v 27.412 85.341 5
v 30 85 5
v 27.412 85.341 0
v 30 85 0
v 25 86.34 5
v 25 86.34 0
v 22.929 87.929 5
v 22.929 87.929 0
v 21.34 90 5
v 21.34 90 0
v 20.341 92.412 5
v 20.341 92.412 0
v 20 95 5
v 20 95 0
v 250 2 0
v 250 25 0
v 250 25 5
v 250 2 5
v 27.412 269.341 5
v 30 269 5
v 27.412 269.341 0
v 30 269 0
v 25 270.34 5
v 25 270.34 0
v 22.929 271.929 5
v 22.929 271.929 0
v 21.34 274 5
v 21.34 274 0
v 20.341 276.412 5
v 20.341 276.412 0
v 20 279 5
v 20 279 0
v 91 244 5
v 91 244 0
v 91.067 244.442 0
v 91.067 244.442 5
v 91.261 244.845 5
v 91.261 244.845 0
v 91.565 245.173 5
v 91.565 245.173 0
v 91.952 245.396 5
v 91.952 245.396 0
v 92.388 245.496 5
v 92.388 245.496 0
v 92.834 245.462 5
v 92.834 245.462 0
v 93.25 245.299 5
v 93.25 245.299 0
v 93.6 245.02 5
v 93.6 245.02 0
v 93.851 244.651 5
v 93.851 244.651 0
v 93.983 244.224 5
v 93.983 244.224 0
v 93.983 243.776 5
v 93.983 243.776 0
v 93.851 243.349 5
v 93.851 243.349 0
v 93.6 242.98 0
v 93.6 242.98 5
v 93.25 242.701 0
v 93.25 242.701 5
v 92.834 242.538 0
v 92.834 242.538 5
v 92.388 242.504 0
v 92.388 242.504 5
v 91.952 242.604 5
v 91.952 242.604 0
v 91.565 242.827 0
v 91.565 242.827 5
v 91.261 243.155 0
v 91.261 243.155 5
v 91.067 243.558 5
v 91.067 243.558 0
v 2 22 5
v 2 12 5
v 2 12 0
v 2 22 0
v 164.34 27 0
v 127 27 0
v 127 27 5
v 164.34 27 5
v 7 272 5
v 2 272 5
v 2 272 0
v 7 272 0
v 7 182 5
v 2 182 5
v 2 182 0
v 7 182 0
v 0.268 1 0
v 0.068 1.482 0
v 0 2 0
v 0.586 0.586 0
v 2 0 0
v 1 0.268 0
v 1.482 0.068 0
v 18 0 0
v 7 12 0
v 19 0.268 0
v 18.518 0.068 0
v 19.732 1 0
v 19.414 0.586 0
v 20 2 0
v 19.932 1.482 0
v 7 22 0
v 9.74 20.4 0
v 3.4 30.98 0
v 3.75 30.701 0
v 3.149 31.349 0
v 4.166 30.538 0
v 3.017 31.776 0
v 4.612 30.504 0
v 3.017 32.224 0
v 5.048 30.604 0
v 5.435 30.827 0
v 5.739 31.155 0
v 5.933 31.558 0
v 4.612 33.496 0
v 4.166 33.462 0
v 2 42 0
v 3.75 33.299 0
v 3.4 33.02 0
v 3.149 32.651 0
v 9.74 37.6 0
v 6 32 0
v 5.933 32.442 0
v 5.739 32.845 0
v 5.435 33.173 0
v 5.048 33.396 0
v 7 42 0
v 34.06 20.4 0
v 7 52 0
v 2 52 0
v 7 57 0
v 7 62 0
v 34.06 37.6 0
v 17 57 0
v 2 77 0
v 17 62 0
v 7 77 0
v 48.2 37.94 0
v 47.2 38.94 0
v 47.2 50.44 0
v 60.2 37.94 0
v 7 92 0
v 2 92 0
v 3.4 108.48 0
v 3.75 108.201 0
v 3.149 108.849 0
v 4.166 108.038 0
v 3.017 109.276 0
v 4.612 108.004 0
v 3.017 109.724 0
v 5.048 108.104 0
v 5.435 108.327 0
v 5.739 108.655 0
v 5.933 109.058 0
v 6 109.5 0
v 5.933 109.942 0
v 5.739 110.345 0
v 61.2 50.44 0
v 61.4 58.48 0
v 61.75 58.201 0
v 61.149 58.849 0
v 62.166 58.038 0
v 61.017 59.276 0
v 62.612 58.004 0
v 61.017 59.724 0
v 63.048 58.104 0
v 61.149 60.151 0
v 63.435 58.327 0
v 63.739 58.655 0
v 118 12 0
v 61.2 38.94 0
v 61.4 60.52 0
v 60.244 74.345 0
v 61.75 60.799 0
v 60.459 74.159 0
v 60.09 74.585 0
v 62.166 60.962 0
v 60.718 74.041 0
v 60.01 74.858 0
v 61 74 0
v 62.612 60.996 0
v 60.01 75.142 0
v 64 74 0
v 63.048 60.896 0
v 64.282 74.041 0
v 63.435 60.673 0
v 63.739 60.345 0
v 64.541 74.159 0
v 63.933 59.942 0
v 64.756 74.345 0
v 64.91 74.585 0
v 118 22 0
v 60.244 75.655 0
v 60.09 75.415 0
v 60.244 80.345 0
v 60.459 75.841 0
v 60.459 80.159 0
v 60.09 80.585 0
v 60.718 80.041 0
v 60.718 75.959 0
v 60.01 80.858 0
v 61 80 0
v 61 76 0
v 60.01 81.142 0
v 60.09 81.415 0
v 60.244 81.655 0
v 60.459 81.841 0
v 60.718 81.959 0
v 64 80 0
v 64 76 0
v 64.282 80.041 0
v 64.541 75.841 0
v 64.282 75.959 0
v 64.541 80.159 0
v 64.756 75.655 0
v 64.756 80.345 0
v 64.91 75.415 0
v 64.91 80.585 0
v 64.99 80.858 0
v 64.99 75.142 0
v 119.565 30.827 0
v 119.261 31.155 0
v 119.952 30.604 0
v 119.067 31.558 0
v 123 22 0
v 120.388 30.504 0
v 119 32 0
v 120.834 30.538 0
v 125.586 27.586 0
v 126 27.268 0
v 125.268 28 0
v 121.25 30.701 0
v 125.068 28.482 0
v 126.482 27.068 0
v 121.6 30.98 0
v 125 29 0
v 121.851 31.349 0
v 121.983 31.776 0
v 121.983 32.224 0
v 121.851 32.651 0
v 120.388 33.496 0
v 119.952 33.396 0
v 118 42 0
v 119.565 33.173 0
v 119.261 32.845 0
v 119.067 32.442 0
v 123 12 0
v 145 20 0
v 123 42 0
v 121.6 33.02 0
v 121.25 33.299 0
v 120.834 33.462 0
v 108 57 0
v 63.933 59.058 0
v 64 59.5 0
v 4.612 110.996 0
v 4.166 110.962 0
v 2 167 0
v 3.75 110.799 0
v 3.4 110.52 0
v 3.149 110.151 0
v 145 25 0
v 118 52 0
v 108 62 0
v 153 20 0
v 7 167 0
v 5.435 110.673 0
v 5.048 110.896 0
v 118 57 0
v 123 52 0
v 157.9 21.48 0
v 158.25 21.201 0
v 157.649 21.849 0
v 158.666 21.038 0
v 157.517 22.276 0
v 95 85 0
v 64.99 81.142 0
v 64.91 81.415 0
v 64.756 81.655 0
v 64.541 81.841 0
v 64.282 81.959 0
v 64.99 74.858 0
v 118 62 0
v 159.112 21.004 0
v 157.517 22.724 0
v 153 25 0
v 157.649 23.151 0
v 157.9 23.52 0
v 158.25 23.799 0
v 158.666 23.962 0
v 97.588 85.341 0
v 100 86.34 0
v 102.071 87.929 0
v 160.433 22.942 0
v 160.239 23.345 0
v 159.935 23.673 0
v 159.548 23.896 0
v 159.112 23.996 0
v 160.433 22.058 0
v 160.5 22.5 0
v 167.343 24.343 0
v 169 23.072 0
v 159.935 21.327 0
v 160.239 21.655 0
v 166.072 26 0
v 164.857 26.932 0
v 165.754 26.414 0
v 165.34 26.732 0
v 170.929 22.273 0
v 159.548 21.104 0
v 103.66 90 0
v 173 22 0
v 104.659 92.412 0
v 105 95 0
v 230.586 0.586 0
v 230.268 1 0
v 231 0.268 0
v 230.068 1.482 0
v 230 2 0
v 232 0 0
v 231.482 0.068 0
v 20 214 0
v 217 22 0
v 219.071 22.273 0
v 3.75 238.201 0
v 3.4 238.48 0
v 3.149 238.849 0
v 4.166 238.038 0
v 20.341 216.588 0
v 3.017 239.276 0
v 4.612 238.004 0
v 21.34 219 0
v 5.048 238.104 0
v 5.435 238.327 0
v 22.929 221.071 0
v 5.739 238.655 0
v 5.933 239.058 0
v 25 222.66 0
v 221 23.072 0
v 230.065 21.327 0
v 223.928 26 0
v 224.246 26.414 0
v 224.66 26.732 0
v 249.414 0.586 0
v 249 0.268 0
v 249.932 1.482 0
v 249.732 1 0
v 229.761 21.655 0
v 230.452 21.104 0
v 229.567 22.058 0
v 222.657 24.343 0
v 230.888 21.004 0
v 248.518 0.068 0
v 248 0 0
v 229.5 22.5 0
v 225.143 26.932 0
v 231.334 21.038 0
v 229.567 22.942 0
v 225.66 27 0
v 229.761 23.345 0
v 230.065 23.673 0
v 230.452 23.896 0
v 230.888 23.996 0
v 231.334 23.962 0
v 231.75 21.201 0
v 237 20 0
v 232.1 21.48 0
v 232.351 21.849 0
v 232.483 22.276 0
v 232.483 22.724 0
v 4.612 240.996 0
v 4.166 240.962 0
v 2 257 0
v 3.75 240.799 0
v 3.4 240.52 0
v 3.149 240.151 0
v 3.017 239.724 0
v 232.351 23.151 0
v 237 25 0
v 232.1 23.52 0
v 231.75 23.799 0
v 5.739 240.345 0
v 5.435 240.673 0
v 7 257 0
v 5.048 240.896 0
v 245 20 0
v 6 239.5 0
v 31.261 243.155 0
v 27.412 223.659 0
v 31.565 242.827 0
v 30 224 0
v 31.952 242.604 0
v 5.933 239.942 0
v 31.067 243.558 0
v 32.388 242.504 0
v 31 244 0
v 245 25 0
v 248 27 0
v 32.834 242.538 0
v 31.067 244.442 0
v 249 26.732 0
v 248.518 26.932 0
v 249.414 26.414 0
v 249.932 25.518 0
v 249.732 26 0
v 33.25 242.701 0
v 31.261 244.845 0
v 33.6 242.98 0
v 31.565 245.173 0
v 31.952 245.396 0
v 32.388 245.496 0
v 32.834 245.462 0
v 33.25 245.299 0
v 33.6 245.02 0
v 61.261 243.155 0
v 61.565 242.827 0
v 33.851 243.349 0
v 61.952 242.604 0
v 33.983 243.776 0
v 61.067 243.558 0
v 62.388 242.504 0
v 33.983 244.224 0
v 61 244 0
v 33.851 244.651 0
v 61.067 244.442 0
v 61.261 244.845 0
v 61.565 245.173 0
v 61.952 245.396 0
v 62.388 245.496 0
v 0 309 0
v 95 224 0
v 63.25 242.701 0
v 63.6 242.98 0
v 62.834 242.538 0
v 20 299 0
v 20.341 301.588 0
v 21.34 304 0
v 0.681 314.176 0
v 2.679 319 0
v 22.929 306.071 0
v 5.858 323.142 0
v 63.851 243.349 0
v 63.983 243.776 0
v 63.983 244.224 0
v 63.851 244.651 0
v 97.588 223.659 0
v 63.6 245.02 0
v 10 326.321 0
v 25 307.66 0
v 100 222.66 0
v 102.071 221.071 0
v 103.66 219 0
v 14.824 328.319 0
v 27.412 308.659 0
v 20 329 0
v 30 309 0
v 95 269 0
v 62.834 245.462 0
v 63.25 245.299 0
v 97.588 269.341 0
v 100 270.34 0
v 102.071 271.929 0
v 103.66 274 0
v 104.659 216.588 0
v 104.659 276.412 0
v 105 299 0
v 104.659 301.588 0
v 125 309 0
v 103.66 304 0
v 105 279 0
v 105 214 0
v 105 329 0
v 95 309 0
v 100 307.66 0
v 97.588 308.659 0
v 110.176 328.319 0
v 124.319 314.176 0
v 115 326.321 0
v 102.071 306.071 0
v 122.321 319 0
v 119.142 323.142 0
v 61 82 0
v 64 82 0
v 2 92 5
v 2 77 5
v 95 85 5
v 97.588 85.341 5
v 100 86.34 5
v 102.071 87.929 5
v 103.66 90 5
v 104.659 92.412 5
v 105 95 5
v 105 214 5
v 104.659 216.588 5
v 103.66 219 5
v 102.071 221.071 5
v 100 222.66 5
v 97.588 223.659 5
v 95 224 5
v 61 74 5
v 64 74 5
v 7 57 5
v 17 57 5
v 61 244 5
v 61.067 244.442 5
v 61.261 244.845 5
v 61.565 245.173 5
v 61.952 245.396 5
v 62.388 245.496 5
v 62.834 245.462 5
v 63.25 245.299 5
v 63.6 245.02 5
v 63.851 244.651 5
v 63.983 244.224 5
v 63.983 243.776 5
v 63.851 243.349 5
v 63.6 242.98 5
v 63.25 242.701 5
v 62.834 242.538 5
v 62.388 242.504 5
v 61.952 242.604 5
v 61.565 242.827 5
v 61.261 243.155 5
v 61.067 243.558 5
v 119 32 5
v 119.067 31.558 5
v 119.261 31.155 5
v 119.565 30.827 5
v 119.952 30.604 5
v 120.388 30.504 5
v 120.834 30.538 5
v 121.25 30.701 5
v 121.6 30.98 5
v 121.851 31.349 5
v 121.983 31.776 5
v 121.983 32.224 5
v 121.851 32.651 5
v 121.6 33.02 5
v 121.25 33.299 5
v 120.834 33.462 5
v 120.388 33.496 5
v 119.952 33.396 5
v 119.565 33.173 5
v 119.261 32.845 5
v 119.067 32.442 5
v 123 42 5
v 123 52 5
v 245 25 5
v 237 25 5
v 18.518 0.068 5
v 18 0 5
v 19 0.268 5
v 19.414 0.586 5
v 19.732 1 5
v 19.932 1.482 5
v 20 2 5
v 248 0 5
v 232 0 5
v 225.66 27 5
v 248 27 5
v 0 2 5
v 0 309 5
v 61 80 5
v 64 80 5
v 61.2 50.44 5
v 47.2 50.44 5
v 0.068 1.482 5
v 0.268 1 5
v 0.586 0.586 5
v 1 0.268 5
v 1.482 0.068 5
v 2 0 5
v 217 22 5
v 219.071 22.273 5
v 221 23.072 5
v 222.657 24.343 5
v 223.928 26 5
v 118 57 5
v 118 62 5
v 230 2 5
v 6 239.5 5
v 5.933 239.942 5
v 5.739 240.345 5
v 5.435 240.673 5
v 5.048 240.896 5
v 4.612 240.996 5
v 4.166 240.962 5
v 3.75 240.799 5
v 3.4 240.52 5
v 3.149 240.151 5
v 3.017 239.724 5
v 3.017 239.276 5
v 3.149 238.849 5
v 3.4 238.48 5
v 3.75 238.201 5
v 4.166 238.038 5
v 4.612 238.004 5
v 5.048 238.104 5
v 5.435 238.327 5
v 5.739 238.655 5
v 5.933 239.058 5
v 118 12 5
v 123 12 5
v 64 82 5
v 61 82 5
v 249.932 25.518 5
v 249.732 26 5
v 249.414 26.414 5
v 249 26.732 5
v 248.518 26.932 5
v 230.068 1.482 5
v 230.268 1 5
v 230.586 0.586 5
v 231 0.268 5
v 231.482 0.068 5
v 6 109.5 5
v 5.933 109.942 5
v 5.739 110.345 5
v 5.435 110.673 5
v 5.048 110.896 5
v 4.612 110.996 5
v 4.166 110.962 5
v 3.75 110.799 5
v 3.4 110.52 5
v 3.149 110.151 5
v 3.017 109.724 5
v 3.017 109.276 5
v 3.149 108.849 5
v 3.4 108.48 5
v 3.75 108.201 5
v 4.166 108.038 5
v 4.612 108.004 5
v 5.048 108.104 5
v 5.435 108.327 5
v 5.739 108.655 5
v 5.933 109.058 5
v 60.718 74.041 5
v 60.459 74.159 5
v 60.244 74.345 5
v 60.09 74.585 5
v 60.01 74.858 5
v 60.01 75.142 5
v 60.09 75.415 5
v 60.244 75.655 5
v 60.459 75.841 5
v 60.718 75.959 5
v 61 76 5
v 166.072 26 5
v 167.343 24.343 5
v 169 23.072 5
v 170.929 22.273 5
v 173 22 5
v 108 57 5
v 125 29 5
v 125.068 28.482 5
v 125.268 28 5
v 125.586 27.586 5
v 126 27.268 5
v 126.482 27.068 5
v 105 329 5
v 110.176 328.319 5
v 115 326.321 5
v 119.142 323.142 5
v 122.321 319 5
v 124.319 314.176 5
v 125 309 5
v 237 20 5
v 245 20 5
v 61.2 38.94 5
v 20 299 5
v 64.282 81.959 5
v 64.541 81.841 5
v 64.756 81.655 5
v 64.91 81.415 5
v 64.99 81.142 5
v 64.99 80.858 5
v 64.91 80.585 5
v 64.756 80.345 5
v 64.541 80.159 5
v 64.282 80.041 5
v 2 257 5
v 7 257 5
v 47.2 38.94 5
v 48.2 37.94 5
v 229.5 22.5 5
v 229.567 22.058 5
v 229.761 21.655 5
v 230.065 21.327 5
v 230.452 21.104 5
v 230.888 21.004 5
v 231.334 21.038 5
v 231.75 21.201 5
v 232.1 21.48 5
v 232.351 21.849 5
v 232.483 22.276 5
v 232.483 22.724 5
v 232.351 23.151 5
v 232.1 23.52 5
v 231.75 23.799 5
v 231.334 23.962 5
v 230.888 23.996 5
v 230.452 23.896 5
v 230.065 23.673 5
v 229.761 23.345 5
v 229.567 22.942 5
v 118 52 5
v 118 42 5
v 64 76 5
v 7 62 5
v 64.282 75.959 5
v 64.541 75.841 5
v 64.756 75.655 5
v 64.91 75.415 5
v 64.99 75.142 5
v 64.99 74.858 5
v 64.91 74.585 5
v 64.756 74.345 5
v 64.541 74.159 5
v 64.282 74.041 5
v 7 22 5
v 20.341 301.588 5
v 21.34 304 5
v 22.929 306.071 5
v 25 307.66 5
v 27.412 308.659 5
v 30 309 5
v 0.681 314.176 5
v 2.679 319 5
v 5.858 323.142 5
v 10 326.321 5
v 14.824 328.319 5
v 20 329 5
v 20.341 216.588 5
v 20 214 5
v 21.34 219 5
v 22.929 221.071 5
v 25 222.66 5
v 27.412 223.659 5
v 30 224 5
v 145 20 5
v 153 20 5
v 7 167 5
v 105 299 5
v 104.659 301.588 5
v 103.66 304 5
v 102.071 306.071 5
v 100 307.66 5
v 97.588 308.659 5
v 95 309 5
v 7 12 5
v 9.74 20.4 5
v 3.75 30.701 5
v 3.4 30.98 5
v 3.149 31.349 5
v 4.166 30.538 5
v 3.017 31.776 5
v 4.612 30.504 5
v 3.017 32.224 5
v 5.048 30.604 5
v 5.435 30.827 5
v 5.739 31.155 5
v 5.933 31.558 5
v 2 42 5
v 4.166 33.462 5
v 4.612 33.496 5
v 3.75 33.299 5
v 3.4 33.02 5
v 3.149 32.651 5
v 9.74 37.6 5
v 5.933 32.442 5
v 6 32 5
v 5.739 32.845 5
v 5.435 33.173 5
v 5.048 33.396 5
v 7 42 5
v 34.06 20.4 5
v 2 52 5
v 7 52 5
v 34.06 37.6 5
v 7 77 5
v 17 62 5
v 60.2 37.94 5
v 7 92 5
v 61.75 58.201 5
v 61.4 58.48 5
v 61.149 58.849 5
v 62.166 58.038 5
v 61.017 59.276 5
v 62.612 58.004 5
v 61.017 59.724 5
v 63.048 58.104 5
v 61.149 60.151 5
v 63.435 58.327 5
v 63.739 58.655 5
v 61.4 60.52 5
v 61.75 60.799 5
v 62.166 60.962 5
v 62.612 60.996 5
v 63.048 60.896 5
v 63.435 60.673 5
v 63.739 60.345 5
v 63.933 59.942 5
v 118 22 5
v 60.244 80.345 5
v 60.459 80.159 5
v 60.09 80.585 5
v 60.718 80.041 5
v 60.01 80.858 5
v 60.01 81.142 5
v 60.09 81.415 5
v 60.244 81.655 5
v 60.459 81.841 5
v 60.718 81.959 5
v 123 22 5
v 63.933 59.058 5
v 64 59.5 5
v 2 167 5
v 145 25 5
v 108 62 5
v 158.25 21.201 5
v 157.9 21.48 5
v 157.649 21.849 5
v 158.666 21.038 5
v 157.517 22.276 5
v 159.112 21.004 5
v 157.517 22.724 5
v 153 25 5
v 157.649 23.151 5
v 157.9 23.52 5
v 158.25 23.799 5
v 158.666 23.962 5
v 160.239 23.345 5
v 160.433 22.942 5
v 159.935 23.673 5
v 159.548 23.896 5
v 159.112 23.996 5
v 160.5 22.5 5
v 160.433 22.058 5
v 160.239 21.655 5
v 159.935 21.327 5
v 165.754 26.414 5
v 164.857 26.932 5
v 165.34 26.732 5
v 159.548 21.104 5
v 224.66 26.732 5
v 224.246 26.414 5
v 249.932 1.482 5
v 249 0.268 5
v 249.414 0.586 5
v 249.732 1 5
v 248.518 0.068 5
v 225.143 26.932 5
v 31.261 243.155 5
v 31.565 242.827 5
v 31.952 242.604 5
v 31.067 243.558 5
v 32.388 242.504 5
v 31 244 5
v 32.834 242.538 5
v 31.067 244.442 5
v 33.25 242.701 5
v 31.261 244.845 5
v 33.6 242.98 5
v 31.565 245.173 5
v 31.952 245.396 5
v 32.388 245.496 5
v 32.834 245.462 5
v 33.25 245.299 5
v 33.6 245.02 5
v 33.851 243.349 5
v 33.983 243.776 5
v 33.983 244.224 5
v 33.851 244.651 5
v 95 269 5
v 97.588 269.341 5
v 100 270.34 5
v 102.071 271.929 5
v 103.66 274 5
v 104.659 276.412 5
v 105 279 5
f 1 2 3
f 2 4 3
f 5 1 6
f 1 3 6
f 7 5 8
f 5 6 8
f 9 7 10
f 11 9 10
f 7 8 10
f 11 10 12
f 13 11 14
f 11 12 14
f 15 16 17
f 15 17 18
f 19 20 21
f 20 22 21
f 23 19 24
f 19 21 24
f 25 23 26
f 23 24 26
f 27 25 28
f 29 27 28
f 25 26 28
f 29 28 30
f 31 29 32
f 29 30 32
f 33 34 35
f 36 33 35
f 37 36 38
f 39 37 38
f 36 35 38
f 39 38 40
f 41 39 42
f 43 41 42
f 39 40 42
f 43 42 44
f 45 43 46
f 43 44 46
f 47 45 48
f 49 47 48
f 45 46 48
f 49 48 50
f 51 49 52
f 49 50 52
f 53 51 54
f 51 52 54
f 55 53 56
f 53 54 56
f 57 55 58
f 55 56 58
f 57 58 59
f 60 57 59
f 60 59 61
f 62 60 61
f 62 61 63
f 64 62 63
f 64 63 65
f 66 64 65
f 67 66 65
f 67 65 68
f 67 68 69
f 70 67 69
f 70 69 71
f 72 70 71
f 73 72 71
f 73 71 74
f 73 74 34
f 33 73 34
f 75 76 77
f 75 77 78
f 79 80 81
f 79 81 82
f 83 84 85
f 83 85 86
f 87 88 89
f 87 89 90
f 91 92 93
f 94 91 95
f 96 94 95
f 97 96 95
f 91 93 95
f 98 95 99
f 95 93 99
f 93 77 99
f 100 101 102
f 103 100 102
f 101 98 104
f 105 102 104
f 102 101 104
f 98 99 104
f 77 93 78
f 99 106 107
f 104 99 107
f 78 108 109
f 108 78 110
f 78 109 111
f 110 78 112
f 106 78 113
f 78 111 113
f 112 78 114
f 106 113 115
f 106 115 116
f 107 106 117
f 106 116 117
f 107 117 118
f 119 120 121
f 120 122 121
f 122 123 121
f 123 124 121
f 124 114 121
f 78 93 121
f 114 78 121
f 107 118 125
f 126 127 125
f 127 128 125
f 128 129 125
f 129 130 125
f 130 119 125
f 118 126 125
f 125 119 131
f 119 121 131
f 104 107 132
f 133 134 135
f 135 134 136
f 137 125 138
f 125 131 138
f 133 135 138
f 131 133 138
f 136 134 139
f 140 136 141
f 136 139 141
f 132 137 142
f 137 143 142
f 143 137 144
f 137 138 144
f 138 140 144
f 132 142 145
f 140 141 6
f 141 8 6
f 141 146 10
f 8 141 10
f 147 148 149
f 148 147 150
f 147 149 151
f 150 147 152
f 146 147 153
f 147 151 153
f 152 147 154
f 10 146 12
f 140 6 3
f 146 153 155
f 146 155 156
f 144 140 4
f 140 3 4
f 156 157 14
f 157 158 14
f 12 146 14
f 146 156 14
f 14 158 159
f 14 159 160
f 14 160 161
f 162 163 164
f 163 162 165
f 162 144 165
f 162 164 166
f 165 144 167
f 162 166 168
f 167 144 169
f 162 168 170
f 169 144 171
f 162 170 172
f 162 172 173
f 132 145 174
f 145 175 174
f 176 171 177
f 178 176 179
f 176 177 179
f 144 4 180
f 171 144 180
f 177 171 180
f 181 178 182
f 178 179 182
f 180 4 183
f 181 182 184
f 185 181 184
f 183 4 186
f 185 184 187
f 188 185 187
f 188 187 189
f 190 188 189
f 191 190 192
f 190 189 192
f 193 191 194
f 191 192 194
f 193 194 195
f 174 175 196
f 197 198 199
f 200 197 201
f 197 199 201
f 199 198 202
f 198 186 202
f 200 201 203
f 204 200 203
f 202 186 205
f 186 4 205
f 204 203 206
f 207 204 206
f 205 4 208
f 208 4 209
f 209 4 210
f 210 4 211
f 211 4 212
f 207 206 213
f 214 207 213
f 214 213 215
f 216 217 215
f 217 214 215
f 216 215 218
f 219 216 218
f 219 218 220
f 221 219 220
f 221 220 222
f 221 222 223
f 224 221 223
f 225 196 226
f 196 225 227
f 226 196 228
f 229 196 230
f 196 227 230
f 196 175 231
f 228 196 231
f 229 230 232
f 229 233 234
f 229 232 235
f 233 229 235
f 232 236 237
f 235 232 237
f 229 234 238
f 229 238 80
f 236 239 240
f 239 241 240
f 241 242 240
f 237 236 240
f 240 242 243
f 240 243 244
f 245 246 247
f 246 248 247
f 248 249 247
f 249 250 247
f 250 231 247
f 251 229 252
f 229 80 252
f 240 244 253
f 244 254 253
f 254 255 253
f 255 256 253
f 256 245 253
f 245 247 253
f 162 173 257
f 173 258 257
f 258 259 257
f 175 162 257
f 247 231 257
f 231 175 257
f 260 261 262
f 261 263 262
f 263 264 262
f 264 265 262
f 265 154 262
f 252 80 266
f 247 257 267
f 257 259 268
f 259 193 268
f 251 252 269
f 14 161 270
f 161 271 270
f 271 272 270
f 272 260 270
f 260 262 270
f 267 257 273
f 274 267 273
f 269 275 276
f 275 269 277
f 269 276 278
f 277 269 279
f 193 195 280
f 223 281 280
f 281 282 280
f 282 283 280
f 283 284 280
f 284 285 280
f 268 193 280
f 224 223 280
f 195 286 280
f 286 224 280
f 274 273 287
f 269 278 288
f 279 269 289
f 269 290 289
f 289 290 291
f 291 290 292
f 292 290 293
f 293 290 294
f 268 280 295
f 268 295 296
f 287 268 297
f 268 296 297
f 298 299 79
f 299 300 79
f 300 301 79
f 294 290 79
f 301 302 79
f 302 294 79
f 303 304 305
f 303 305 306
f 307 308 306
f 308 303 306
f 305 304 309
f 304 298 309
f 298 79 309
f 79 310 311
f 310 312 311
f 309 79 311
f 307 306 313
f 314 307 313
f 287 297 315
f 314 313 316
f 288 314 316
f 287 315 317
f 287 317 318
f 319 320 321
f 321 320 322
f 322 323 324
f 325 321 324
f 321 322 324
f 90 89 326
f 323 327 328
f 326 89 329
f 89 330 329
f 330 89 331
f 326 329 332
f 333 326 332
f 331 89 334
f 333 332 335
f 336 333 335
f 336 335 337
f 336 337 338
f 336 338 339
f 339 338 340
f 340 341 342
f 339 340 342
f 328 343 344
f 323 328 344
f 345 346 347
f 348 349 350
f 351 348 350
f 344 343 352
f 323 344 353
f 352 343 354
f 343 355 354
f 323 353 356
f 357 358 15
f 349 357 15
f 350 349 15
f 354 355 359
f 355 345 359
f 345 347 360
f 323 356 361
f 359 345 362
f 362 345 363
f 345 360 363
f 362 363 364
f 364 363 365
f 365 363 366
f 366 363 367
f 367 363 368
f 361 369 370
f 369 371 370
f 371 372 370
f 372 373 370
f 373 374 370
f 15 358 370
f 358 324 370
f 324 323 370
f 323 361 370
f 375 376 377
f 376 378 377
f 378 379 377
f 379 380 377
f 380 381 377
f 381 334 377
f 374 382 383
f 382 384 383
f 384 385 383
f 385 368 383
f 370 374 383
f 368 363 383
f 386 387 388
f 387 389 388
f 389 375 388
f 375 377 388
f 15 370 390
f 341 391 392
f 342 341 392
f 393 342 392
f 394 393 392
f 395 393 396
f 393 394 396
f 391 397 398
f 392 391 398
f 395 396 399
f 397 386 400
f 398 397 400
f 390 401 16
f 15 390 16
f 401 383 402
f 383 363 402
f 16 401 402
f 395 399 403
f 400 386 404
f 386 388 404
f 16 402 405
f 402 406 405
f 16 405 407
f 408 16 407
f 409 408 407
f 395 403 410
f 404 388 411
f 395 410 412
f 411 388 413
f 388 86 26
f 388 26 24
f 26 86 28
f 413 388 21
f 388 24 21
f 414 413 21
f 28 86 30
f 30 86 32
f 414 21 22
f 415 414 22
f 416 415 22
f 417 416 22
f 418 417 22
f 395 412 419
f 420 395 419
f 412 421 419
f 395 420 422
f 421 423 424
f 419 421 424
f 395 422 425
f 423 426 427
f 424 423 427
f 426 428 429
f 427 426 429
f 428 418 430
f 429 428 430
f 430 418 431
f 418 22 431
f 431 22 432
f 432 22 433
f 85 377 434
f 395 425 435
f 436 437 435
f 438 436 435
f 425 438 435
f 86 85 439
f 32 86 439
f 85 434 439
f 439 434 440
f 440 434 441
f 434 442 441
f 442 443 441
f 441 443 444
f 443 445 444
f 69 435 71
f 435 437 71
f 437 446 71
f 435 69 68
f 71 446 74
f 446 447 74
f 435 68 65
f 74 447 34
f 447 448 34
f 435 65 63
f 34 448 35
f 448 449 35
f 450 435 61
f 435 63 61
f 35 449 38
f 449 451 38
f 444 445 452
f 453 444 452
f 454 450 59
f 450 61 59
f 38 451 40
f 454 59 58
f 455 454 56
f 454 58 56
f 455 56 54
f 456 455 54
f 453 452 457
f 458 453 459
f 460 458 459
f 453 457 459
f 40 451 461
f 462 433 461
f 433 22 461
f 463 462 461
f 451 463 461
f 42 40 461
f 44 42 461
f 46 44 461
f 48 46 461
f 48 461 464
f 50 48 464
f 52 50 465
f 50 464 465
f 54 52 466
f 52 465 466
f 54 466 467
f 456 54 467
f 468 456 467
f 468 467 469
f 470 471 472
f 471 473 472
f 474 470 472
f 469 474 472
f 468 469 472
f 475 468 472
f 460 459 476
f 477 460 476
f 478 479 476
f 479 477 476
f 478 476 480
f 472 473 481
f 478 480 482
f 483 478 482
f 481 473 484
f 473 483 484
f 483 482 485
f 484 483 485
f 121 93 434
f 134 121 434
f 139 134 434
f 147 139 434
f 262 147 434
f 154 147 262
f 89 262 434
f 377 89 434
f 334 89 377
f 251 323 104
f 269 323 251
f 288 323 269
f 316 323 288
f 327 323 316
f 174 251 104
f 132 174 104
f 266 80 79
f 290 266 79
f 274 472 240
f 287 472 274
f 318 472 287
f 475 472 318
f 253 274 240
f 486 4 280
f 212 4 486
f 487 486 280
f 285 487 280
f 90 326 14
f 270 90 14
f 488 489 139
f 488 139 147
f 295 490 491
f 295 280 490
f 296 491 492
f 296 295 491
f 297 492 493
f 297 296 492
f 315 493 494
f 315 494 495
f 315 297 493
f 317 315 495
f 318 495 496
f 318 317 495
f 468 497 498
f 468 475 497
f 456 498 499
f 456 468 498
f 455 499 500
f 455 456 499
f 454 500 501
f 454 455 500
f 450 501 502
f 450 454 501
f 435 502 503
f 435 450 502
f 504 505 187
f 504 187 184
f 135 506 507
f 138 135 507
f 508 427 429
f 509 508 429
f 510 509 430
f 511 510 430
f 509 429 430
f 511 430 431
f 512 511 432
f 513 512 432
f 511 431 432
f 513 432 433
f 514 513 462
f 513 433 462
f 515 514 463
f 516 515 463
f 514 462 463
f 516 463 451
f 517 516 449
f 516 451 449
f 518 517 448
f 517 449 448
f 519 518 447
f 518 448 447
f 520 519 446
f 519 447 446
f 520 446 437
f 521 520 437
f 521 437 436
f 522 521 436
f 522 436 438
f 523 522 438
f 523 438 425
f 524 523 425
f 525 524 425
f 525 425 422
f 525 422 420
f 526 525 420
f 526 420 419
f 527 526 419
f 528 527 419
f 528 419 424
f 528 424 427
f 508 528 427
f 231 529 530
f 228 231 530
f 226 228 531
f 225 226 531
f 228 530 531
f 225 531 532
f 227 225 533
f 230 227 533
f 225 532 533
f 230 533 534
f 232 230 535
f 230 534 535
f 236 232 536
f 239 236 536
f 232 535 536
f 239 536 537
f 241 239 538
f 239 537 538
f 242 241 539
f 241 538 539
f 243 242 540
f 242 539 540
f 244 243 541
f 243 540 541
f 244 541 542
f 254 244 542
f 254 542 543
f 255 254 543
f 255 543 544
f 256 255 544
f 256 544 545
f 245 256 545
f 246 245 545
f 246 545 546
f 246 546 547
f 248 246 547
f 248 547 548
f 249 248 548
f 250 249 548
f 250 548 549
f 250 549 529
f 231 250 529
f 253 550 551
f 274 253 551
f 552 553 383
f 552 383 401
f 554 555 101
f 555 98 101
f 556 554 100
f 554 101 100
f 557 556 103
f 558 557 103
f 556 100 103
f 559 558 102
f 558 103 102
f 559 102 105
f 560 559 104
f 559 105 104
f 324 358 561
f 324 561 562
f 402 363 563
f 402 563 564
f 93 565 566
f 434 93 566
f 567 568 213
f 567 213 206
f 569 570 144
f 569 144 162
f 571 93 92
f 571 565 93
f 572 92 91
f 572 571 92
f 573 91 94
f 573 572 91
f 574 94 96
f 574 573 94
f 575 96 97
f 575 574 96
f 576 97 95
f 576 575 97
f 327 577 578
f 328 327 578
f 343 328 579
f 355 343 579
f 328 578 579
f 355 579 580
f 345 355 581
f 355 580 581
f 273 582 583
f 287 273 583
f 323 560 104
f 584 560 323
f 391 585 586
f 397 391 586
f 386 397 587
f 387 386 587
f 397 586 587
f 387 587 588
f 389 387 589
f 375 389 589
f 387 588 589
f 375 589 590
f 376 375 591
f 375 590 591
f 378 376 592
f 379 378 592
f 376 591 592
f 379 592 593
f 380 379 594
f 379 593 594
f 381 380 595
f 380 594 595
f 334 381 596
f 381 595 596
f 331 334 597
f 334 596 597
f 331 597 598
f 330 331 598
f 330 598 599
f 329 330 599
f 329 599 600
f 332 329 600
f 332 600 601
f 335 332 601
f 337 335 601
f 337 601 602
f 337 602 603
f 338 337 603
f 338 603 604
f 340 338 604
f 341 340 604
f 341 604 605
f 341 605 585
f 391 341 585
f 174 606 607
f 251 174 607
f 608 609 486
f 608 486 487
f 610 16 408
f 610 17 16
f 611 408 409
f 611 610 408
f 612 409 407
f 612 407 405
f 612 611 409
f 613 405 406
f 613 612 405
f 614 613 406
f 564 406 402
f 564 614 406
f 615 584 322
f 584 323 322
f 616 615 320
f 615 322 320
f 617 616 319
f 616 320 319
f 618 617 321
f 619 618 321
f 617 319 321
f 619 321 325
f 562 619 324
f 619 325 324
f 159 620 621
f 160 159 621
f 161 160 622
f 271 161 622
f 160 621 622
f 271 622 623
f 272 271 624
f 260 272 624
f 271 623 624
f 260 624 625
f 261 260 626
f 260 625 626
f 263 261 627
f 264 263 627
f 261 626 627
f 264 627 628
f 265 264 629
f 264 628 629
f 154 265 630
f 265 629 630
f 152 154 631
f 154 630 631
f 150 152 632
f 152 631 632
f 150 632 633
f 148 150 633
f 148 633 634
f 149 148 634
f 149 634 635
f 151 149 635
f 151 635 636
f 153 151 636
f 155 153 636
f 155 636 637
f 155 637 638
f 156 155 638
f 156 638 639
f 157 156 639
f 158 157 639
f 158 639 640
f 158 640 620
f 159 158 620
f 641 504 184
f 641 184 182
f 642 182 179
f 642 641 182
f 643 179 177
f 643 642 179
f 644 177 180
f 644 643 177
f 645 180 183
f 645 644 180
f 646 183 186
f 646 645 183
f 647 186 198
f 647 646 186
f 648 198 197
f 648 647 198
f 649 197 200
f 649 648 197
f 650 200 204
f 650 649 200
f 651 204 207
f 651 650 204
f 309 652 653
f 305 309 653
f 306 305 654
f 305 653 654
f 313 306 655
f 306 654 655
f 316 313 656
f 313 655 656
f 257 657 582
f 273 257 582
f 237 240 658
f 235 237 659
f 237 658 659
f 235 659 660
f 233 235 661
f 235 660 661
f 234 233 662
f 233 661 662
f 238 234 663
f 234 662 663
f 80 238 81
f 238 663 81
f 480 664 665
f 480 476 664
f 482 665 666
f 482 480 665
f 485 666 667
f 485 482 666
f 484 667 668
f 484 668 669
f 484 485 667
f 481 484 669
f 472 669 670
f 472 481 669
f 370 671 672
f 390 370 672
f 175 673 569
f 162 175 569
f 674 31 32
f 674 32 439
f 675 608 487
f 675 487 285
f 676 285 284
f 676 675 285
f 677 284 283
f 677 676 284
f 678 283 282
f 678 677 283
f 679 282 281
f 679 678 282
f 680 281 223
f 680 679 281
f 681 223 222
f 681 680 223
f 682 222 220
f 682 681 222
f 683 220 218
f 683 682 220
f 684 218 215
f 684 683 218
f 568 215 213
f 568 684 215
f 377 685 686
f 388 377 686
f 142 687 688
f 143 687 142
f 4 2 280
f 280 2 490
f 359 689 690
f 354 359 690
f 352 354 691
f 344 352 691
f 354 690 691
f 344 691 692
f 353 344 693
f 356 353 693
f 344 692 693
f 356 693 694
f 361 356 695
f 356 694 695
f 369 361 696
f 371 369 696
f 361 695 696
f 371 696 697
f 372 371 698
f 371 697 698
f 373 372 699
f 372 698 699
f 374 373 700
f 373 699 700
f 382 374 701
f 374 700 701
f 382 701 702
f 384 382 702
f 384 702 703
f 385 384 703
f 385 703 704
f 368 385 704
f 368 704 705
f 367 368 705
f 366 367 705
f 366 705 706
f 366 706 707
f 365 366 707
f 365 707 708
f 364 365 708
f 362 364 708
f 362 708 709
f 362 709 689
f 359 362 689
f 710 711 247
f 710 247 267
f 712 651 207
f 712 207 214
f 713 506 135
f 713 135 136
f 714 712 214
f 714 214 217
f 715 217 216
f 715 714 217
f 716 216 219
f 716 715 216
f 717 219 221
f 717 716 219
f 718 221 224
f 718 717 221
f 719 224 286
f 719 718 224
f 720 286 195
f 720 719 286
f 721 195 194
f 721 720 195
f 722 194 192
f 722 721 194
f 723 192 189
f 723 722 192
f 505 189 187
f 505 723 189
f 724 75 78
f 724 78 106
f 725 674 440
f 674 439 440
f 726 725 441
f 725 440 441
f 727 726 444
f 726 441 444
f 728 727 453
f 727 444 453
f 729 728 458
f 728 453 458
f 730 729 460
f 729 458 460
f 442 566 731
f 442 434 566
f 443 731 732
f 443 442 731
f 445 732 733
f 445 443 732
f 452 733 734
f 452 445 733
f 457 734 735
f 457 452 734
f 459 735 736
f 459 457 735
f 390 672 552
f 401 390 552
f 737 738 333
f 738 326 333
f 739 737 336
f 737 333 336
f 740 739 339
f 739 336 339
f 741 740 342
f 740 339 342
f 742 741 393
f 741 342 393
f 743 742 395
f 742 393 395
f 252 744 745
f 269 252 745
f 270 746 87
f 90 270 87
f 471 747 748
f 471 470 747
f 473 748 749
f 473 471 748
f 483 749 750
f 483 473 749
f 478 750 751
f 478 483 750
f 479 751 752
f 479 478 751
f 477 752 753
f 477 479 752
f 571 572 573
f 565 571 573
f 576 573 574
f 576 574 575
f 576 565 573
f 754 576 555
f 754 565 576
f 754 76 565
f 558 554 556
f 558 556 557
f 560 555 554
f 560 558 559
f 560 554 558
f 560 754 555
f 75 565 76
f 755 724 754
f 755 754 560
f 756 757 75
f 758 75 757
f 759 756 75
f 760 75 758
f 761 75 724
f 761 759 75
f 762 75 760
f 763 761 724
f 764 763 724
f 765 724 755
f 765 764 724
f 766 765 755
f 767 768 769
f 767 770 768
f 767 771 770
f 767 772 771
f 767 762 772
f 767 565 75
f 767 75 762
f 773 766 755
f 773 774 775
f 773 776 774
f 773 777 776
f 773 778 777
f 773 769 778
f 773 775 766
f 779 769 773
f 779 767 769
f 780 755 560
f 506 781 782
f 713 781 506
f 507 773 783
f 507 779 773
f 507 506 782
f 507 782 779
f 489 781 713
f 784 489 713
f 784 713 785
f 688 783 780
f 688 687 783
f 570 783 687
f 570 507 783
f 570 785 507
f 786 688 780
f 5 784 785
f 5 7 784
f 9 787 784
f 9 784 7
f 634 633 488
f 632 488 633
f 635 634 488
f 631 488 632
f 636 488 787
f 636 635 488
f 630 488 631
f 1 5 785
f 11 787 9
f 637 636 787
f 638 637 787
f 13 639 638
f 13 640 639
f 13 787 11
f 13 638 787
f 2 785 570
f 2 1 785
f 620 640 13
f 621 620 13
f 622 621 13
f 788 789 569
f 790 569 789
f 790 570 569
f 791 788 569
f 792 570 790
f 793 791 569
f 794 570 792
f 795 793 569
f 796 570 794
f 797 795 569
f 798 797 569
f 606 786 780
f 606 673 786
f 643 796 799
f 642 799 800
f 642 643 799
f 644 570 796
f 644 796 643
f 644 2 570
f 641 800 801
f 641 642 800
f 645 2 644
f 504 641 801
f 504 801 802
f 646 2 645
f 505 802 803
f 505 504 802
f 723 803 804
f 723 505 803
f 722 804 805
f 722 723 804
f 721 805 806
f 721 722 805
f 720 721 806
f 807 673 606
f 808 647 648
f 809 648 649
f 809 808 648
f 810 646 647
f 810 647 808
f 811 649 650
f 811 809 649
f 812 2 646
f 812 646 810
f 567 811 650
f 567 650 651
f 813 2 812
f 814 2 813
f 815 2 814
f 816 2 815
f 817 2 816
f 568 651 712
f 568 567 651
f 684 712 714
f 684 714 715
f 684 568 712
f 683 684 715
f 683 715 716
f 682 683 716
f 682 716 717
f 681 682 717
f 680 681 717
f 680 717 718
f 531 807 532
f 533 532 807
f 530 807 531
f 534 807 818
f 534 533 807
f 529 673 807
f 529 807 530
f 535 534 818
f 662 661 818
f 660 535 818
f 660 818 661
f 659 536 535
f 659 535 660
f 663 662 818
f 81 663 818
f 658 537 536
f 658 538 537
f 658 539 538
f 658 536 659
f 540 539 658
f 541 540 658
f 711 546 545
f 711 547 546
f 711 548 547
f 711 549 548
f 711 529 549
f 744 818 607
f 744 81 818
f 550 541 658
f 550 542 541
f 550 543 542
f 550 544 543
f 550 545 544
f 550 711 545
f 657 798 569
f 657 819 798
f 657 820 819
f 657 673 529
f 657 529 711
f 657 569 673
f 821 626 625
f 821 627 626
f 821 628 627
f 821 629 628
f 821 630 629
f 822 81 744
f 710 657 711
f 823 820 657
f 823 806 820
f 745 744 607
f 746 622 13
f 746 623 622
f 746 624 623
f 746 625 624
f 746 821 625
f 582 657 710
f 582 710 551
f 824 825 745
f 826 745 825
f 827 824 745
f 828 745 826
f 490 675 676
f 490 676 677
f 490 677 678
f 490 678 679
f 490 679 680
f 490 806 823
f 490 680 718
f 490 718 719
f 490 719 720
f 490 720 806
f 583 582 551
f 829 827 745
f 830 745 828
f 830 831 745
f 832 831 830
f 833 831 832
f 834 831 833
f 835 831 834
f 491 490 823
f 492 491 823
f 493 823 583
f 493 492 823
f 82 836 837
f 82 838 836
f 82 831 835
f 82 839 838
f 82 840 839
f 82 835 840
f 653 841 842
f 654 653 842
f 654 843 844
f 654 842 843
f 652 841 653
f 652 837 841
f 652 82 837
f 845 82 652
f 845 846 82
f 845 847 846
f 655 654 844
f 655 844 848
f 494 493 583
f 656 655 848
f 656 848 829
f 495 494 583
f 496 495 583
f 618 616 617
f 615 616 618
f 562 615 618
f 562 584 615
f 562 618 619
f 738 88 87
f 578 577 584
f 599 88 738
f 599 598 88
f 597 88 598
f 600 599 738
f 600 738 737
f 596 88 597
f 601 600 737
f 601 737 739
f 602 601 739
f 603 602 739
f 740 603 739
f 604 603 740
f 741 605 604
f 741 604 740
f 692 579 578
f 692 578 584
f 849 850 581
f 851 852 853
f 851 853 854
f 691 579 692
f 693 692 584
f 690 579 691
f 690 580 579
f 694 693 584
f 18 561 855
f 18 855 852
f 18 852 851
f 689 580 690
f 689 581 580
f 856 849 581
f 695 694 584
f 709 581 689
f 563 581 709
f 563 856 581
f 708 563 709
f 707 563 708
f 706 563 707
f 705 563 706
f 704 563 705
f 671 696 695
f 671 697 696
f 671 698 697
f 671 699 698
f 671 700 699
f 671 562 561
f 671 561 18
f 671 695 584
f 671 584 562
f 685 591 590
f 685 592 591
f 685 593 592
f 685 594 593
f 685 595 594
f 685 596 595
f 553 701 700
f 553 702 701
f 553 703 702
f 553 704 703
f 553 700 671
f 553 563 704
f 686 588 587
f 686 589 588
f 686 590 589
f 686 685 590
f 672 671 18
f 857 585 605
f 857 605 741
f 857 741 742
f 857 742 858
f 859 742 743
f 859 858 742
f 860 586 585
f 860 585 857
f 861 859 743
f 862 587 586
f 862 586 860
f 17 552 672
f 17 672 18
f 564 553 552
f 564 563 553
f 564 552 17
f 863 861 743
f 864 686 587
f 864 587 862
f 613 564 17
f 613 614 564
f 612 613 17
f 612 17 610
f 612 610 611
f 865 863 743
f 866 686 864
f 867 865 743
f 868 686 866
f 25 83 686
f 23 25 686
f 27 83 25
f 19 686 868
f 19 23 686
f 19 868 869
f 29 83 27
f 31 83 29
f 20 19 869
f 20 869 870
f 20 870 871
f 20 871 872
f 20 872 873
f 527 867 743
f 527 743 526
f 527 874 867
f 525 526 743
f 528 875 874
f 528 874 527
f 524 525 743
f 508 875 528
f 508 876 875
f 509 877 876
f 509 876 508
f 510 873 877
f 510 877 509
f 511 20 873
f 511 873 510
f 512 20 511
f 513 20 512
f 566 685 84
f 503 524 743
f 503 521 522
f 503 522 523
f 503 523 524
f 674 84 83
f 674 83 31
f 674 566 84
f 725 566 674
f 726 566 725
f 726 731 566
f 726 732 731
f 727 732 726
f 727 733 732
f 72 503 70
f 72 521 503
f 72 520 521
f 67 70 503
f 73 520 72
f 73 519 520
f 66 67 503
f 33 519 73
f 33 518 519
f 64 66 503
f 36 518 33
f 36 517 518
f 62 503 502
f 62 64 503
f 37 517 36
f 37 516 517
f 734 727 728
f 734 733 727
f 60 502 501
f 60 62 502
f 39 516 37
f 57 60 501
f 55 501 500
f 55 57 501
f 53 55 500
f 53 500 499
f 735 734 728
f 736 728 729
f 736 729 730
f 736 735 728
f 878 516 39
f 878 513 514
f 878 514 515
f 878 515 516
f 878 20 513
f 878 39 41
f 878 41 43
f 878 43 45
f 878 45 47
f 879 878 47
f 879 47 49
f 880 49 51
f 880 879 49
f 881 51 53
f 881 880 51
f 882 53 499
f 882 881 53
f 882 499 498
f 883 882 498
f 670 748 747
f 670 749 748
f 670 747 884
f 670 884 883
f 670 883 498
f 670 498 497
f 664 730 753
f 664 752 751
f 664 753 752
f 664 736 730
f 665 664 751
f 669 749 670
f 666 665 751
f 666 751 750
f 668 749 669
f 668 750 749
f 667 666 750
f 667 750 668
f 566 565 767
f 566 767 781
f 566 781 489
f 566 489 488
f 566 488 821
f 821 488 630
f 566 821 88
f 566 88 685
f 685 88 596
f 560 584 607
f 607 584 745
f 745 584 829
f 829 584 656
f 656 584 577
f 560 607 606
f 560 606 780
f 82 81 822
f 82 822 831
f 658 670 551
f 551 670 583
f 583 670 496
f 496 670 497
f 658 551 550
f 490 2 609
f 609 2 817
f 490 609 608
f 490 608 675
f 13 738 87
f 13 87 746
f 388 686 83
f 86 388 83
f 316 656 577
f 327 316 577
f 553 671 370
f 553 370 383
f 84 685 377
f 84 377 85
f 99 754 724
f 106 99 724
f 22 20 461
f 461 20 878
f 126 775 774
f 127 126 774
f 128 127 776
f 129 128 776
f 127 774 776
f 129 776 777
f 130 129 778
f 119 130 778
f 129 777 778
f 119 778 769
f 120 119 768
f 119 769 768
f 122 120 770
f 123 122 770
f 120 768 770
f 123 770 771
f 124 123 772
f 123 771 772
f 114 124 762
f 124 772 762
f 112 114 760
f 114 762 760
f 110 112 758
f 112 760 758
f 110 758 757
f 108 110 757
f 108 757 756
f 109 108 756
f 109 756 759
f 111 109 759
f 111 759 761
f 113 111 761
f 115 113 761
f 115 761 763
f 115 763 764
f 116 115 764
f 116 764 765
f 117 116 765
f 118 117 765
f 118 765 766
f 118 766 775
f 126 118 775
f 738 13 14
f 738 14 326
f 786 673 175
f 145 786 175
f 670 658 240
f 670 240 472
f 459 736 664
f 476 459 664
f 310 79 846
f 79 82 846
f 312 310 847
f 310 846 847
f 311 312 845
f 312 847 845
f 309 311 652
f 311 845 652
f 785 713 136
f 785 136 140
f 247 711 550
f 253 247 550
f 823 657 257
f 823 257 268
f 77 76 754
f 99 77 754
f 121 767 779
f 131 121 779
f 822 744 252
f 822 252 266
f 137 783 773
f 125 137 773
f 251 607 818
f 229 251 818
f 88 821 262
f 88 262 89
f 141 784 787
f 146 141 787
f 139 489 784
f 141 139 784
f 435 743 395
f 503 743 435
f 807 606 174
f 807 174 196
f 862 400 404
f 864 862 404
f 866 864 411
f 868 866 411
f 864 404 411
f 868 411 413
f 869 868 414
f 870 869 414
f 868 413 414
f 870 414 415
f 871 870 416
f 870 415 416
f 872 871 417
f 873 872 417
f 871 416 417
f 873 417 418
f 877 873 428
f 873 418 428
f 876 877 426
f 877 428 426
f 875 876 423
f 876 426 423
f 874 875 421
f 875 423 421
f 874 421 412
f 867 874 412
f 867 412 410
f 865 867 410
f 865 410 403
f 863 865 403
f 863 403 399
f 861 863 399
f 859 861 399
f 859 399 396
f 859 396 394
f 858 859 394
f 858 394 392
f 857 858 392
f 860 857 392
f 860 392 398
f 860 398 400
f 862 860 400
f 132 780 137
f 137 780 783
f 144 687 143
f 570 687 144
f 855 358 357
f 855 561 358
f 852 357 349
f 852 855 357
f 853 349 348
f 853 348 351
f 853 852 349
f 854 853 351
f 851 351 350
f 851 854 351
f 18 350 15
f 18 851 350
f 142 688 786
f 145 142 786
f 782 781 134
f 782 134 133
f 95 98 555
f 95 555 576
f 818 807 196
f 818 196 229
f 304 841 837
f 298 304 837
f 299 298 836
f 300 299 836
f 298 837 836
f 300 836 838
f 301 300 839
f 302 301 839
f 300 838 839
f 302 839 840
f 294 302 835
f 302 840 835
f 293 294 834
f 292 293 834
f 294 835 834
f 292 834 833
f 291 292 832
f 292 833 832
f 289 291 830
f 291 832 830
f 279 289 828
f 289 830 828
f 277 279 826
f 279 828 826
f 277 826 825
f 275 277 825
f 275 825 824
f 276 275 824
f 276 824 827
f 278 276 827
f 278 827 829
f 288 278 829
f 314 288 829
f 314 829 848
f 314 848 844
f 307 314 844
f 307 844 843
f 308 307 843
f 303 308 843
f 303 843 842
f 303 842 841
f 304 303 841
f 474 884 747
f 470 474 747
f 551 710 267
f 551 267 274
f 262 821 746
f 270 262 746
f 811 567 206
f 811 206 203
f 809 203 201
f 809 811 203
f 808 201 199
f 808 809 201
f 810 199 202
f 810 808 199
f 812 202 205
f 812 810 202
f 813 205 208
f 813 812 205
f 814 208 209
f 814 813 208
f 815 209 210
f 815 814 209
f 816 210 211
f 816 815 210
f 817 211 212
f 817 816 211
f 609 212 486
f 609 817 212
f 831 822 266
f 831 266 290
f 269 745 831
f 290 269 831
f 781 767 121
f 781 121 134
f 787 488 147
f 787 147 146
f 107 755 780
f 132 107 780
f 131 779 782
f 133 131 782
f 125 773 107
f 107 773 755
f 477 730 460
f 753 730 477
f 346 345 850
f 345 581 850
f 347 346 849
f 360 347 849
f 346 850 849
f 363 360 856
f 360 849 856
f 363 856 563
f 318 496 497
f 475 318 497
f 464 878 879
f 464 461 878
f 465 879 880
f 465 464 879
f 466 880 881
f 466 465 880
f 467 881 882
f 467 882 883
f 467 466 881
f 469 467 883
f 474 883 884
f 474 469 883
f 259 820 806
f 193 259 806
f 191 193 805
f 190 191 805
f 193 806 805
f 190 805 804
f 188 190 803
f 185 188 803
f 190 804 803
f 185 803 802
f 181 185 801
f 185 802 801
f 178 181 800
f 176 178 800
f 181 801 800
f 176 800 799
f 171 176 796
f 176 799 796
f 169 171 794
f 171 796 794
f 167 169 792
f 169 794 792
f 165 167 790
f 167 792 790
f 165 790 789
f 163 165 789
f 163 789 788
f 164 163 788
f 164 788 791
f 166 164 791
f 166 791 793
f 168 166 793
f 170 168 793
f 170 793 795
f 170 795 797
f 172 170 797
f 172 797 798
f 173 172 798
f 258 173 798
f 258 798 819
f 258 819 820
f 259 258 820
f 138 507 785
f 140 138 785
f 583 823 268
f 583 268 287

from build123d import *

# Parameters (mm, degrees)
BOSS_EXTRUDE1_DEPTH = 5
SKETCH7_W           = 14
SKETCH7_H           = 12.5
CUT_EXTRUDE4_DEPTH  = 259.110441478
SKETCH3_W           = 125
SKETCH3_H           = 265
BOSS_EXTRUDE2_DEPTH = 5
SKETCH4_W           = 85
SKETCH4_H           = 40
SKETCH4_H_2         = 139
CUT_EXTRUDE2_DEPTH  = 414.238429965
SKETCH2_R           = 1.5
SKETCH2_W           = 10
SKETCH2_H           = 5
SKETCH2_W_2         = 8
SKETCH2_W_3         = 5
SKETCH2_H_2         = 10
SKETCH2_W_4         = 210
SKETCH2_H_3         = 2
SKETCH2_H_4         = 15
CUT_EXTRUDE1_DEPTH  = 414.238429965
SKETCH5_R           = 1.5
CUT_EXTRUDE3_DEPTH  = 414.238429965
FILLET1_R           = 2
FILLET2_R           = 10
FILLET3_R           = 20
CHAMFER1_SIZE       = 1


with BuildPart() as part:
    # Sketch1 → Boss-Extrude1 (new body)
    with BuildSketch(Plane.XY):
        Polygon((0, 0), (0, 64), (125, 64), (125, 27), (250, 27), (250, 0), align=None)
    extrude(amount=BOSS_EXTRUDE1_DEPTH)

    # Sketch7 → Cut-Extrude4 (cut, through all)
    with BuildSketch(Plane.XY.offset(5)):
        with Locations((54.2, 44.19)):
            Rectangle(SKETCH7_W, SKETCH7_H)
        Polygon((9.74, 28.1), (9.74, 20.4), (34.06, 20.4), (34.06, 28.1), (34.06, 37.6), (9.74, 37.6), align=None)
    extrude(amount=-CUT_EXTRUDE4_DEPTH, mode=Mode.SUBTRACT)

    # Sketch3 → Boss-Extrude2 (add)
    with BuildSketch(Plane.XY.offset(5)):
        with Locations((62.5, 196.5)):
            Rectangle(SKETCH3_W, SKETCH3_H)
    extrude(amount=-BOSS_EXTRUDE2_DEPTH)

    # Sketch4 → Cut-Extrude2 (cut, through all)
    with BuildSketch(Plane.XY.offset(5)):
        with Locations((62.5, 289)):
            Rectangle(SKETCH4_W, SKETCH4_H)
        with Locations((62.5, 154.5)):
            Rectangle(SKETCH4_W, SKETCH4_H_2)
    extrude(amount=-CUT_EXTRUDE2_DEPTH, mode=Mode.SUBTRACT)

    # Sketch2 → Cut-Extrude1 (cut, through all)
    with BuildSketch(Plane.XY.offset(5)):
        with Locations((4.5, 32)):
            Circle(SKETCH2_R)
        with Locations((62.5, 59.5)):
            Circle(SKETCH2_R)
        with Locations(Location((120.5, 32, 0), (0, 0, 180))):
            Circle(SKETCH2_R)
        with Locations((159, 22.5)):
            Circle(SKETCH2_R)
        with Locations(Location((231, 22.5, 0), (0, 0, 180))):
            Circle(SKETCH2_R)
        with Locations((4.5, 109.5)):
            Circle(SKETCH2_R)
        with Locations((4.5, 239.5)):
            Circle(SKETCH2_R)
        with Locations((12, 59.5)):
            Rectangle(SKETCH2_W, SKETCH2_H)
        with Locations((113, 59.5)):
            Rectangle(SKETCH2_W, SKETCH2_H)
        with Locations((241, 22.5)):
            Rectangle(SKETCH2_W_2, SKETCH2_H)
        with Locations((149, 22.5)):
            Rectangle(SKETCH2_W_2, SKETCH2_H)
        with Locations((120.5, 47)):
            Rectangle(SKETCH2_W_3, SKETCH2_H_2)
        with Locations((120.5, 17)):
            Rectangle(SKETCH2_W_3, SKETCH2_H_2)
        with Locations((4.5, 17)):
            Rectangle(SKETCH2_W_3, SKETCH2_H_2)
        with Locations((4.5, 47)):
            Rectangle(SKETCH2_W_3, SKETCH2_H_2)
        with BuildLine():
            Line((173, 22), (217, 22))
            ThreePointArc((217, 22), (225, 30), (217, 38))
            Line((217, 38), (173, 38))
            ThreePointArc((173, 38), (165, 30), (173, 22))
        make_face()
        with Locations((125, 1)):
            Rectangle(SKETCH2_W_4, SKETCH2_H_3)
        with Locations((4.5, 84.5)):
            Rectangle(SKETCH2_W_3, SKETCH2_H_4)
        with Locations((4.5, 264.5)):
            Rectangle(SKETCH2_W_3, SKETCH2_H_4)
        with Locations((4.5, 174.5)):
            Rectangle(SKETCH2_W_3, SKETCH2_H_4)
        with BuildLine():
            Line((61, 82), (64, 82))
            ThreePointArc((64, 82), (65, 81), (64, 80))
            Line((64, 80), (61, 80))
            ThreePointArc((61, 80), (60, 81), (61, 82))
        make_face()
        with BuildLine():
            Line((61, 76), (64, 76))
            ThreePointArc((64, 76), (65, 75), (64, 74))
            Line((64, 74), (61, 74))
            ThreePointArc((61, 74), (60, 75), (61, 76))
        make_face()
    extrude(amount=-CUT_EXTRUDE1_DEPTH, mode=Mode.SUBTRACT)

    # Sketch5 → Cut-Extrude3 (cut, through all)
    with BuildSketch(Plane(origin=(0, 0, 0), x_dir=(-1, 0, 0), z_dir=(0, 0, -1))):
        with Locations((-92.5, 244)):
            Circle(SKETCH5_R)
        with Locations((-62.5, 244)):
            Circle(SKETCH5_R)
        with Locations((-32.5, 244)):
            Circle(SKETCH5_R)
    extrude(amount=-CUT_EXTRUDE3_DEPTH, mode=Mode.SUBTRACT)

    # Fillet1
    fillet1_edges = [part.edges().sort_by_distance(p)[0] for p in [
        (250, 0, 2.5),
        (250, 27, 2.5),
        (0, 0, 2.5),
        (125, 27, 2.5),
        (224.416198487, 27, 2.5),
        (165.583801513, 27, 2.5),
        (230, 0, 2.5),
        (20, 0, 2.5),
    ]]
    fillet(fillet1_edges, radius=FILLET1_R - 0.0001)  # a hair under: the kernel refuses the full size

    # Fillet2
    fillet2_edges = [part.edges().sort_by_distance(p)[0] for p in [
        (20, 269, 2.5),
        (20, 309, 2.5),
        (105, 309, 2.5),
        (105, 269, 2.5),
        (105, 224, 2.5),
        (105, 85, 2.5),
        (20, 85, 2.5),
        (20, 224, 2.5),
    ]]
    fillet(fillet2_edges, radius=FILLET2_R)

    # Fillet3
    fillet3_edges = [part.edges().sort_by_distance(p)[0] for p in [
        (125, 329, 2.5),
        (0, 329, 2.5),
    ]]
    fillet(fillet3_edges, radius=FILLET3_R)

    # Chamfer1
    chamfer1_edges = [part.edges().sort_by_distance(p)[0] for p in [
        (47.2, 37.94, 2.5),
        (61.2, 37.94, 2.5),
    ]]
    chamfer(chamfer1_edges, length=CHAMFER1_SIZE)


solid = part.part
